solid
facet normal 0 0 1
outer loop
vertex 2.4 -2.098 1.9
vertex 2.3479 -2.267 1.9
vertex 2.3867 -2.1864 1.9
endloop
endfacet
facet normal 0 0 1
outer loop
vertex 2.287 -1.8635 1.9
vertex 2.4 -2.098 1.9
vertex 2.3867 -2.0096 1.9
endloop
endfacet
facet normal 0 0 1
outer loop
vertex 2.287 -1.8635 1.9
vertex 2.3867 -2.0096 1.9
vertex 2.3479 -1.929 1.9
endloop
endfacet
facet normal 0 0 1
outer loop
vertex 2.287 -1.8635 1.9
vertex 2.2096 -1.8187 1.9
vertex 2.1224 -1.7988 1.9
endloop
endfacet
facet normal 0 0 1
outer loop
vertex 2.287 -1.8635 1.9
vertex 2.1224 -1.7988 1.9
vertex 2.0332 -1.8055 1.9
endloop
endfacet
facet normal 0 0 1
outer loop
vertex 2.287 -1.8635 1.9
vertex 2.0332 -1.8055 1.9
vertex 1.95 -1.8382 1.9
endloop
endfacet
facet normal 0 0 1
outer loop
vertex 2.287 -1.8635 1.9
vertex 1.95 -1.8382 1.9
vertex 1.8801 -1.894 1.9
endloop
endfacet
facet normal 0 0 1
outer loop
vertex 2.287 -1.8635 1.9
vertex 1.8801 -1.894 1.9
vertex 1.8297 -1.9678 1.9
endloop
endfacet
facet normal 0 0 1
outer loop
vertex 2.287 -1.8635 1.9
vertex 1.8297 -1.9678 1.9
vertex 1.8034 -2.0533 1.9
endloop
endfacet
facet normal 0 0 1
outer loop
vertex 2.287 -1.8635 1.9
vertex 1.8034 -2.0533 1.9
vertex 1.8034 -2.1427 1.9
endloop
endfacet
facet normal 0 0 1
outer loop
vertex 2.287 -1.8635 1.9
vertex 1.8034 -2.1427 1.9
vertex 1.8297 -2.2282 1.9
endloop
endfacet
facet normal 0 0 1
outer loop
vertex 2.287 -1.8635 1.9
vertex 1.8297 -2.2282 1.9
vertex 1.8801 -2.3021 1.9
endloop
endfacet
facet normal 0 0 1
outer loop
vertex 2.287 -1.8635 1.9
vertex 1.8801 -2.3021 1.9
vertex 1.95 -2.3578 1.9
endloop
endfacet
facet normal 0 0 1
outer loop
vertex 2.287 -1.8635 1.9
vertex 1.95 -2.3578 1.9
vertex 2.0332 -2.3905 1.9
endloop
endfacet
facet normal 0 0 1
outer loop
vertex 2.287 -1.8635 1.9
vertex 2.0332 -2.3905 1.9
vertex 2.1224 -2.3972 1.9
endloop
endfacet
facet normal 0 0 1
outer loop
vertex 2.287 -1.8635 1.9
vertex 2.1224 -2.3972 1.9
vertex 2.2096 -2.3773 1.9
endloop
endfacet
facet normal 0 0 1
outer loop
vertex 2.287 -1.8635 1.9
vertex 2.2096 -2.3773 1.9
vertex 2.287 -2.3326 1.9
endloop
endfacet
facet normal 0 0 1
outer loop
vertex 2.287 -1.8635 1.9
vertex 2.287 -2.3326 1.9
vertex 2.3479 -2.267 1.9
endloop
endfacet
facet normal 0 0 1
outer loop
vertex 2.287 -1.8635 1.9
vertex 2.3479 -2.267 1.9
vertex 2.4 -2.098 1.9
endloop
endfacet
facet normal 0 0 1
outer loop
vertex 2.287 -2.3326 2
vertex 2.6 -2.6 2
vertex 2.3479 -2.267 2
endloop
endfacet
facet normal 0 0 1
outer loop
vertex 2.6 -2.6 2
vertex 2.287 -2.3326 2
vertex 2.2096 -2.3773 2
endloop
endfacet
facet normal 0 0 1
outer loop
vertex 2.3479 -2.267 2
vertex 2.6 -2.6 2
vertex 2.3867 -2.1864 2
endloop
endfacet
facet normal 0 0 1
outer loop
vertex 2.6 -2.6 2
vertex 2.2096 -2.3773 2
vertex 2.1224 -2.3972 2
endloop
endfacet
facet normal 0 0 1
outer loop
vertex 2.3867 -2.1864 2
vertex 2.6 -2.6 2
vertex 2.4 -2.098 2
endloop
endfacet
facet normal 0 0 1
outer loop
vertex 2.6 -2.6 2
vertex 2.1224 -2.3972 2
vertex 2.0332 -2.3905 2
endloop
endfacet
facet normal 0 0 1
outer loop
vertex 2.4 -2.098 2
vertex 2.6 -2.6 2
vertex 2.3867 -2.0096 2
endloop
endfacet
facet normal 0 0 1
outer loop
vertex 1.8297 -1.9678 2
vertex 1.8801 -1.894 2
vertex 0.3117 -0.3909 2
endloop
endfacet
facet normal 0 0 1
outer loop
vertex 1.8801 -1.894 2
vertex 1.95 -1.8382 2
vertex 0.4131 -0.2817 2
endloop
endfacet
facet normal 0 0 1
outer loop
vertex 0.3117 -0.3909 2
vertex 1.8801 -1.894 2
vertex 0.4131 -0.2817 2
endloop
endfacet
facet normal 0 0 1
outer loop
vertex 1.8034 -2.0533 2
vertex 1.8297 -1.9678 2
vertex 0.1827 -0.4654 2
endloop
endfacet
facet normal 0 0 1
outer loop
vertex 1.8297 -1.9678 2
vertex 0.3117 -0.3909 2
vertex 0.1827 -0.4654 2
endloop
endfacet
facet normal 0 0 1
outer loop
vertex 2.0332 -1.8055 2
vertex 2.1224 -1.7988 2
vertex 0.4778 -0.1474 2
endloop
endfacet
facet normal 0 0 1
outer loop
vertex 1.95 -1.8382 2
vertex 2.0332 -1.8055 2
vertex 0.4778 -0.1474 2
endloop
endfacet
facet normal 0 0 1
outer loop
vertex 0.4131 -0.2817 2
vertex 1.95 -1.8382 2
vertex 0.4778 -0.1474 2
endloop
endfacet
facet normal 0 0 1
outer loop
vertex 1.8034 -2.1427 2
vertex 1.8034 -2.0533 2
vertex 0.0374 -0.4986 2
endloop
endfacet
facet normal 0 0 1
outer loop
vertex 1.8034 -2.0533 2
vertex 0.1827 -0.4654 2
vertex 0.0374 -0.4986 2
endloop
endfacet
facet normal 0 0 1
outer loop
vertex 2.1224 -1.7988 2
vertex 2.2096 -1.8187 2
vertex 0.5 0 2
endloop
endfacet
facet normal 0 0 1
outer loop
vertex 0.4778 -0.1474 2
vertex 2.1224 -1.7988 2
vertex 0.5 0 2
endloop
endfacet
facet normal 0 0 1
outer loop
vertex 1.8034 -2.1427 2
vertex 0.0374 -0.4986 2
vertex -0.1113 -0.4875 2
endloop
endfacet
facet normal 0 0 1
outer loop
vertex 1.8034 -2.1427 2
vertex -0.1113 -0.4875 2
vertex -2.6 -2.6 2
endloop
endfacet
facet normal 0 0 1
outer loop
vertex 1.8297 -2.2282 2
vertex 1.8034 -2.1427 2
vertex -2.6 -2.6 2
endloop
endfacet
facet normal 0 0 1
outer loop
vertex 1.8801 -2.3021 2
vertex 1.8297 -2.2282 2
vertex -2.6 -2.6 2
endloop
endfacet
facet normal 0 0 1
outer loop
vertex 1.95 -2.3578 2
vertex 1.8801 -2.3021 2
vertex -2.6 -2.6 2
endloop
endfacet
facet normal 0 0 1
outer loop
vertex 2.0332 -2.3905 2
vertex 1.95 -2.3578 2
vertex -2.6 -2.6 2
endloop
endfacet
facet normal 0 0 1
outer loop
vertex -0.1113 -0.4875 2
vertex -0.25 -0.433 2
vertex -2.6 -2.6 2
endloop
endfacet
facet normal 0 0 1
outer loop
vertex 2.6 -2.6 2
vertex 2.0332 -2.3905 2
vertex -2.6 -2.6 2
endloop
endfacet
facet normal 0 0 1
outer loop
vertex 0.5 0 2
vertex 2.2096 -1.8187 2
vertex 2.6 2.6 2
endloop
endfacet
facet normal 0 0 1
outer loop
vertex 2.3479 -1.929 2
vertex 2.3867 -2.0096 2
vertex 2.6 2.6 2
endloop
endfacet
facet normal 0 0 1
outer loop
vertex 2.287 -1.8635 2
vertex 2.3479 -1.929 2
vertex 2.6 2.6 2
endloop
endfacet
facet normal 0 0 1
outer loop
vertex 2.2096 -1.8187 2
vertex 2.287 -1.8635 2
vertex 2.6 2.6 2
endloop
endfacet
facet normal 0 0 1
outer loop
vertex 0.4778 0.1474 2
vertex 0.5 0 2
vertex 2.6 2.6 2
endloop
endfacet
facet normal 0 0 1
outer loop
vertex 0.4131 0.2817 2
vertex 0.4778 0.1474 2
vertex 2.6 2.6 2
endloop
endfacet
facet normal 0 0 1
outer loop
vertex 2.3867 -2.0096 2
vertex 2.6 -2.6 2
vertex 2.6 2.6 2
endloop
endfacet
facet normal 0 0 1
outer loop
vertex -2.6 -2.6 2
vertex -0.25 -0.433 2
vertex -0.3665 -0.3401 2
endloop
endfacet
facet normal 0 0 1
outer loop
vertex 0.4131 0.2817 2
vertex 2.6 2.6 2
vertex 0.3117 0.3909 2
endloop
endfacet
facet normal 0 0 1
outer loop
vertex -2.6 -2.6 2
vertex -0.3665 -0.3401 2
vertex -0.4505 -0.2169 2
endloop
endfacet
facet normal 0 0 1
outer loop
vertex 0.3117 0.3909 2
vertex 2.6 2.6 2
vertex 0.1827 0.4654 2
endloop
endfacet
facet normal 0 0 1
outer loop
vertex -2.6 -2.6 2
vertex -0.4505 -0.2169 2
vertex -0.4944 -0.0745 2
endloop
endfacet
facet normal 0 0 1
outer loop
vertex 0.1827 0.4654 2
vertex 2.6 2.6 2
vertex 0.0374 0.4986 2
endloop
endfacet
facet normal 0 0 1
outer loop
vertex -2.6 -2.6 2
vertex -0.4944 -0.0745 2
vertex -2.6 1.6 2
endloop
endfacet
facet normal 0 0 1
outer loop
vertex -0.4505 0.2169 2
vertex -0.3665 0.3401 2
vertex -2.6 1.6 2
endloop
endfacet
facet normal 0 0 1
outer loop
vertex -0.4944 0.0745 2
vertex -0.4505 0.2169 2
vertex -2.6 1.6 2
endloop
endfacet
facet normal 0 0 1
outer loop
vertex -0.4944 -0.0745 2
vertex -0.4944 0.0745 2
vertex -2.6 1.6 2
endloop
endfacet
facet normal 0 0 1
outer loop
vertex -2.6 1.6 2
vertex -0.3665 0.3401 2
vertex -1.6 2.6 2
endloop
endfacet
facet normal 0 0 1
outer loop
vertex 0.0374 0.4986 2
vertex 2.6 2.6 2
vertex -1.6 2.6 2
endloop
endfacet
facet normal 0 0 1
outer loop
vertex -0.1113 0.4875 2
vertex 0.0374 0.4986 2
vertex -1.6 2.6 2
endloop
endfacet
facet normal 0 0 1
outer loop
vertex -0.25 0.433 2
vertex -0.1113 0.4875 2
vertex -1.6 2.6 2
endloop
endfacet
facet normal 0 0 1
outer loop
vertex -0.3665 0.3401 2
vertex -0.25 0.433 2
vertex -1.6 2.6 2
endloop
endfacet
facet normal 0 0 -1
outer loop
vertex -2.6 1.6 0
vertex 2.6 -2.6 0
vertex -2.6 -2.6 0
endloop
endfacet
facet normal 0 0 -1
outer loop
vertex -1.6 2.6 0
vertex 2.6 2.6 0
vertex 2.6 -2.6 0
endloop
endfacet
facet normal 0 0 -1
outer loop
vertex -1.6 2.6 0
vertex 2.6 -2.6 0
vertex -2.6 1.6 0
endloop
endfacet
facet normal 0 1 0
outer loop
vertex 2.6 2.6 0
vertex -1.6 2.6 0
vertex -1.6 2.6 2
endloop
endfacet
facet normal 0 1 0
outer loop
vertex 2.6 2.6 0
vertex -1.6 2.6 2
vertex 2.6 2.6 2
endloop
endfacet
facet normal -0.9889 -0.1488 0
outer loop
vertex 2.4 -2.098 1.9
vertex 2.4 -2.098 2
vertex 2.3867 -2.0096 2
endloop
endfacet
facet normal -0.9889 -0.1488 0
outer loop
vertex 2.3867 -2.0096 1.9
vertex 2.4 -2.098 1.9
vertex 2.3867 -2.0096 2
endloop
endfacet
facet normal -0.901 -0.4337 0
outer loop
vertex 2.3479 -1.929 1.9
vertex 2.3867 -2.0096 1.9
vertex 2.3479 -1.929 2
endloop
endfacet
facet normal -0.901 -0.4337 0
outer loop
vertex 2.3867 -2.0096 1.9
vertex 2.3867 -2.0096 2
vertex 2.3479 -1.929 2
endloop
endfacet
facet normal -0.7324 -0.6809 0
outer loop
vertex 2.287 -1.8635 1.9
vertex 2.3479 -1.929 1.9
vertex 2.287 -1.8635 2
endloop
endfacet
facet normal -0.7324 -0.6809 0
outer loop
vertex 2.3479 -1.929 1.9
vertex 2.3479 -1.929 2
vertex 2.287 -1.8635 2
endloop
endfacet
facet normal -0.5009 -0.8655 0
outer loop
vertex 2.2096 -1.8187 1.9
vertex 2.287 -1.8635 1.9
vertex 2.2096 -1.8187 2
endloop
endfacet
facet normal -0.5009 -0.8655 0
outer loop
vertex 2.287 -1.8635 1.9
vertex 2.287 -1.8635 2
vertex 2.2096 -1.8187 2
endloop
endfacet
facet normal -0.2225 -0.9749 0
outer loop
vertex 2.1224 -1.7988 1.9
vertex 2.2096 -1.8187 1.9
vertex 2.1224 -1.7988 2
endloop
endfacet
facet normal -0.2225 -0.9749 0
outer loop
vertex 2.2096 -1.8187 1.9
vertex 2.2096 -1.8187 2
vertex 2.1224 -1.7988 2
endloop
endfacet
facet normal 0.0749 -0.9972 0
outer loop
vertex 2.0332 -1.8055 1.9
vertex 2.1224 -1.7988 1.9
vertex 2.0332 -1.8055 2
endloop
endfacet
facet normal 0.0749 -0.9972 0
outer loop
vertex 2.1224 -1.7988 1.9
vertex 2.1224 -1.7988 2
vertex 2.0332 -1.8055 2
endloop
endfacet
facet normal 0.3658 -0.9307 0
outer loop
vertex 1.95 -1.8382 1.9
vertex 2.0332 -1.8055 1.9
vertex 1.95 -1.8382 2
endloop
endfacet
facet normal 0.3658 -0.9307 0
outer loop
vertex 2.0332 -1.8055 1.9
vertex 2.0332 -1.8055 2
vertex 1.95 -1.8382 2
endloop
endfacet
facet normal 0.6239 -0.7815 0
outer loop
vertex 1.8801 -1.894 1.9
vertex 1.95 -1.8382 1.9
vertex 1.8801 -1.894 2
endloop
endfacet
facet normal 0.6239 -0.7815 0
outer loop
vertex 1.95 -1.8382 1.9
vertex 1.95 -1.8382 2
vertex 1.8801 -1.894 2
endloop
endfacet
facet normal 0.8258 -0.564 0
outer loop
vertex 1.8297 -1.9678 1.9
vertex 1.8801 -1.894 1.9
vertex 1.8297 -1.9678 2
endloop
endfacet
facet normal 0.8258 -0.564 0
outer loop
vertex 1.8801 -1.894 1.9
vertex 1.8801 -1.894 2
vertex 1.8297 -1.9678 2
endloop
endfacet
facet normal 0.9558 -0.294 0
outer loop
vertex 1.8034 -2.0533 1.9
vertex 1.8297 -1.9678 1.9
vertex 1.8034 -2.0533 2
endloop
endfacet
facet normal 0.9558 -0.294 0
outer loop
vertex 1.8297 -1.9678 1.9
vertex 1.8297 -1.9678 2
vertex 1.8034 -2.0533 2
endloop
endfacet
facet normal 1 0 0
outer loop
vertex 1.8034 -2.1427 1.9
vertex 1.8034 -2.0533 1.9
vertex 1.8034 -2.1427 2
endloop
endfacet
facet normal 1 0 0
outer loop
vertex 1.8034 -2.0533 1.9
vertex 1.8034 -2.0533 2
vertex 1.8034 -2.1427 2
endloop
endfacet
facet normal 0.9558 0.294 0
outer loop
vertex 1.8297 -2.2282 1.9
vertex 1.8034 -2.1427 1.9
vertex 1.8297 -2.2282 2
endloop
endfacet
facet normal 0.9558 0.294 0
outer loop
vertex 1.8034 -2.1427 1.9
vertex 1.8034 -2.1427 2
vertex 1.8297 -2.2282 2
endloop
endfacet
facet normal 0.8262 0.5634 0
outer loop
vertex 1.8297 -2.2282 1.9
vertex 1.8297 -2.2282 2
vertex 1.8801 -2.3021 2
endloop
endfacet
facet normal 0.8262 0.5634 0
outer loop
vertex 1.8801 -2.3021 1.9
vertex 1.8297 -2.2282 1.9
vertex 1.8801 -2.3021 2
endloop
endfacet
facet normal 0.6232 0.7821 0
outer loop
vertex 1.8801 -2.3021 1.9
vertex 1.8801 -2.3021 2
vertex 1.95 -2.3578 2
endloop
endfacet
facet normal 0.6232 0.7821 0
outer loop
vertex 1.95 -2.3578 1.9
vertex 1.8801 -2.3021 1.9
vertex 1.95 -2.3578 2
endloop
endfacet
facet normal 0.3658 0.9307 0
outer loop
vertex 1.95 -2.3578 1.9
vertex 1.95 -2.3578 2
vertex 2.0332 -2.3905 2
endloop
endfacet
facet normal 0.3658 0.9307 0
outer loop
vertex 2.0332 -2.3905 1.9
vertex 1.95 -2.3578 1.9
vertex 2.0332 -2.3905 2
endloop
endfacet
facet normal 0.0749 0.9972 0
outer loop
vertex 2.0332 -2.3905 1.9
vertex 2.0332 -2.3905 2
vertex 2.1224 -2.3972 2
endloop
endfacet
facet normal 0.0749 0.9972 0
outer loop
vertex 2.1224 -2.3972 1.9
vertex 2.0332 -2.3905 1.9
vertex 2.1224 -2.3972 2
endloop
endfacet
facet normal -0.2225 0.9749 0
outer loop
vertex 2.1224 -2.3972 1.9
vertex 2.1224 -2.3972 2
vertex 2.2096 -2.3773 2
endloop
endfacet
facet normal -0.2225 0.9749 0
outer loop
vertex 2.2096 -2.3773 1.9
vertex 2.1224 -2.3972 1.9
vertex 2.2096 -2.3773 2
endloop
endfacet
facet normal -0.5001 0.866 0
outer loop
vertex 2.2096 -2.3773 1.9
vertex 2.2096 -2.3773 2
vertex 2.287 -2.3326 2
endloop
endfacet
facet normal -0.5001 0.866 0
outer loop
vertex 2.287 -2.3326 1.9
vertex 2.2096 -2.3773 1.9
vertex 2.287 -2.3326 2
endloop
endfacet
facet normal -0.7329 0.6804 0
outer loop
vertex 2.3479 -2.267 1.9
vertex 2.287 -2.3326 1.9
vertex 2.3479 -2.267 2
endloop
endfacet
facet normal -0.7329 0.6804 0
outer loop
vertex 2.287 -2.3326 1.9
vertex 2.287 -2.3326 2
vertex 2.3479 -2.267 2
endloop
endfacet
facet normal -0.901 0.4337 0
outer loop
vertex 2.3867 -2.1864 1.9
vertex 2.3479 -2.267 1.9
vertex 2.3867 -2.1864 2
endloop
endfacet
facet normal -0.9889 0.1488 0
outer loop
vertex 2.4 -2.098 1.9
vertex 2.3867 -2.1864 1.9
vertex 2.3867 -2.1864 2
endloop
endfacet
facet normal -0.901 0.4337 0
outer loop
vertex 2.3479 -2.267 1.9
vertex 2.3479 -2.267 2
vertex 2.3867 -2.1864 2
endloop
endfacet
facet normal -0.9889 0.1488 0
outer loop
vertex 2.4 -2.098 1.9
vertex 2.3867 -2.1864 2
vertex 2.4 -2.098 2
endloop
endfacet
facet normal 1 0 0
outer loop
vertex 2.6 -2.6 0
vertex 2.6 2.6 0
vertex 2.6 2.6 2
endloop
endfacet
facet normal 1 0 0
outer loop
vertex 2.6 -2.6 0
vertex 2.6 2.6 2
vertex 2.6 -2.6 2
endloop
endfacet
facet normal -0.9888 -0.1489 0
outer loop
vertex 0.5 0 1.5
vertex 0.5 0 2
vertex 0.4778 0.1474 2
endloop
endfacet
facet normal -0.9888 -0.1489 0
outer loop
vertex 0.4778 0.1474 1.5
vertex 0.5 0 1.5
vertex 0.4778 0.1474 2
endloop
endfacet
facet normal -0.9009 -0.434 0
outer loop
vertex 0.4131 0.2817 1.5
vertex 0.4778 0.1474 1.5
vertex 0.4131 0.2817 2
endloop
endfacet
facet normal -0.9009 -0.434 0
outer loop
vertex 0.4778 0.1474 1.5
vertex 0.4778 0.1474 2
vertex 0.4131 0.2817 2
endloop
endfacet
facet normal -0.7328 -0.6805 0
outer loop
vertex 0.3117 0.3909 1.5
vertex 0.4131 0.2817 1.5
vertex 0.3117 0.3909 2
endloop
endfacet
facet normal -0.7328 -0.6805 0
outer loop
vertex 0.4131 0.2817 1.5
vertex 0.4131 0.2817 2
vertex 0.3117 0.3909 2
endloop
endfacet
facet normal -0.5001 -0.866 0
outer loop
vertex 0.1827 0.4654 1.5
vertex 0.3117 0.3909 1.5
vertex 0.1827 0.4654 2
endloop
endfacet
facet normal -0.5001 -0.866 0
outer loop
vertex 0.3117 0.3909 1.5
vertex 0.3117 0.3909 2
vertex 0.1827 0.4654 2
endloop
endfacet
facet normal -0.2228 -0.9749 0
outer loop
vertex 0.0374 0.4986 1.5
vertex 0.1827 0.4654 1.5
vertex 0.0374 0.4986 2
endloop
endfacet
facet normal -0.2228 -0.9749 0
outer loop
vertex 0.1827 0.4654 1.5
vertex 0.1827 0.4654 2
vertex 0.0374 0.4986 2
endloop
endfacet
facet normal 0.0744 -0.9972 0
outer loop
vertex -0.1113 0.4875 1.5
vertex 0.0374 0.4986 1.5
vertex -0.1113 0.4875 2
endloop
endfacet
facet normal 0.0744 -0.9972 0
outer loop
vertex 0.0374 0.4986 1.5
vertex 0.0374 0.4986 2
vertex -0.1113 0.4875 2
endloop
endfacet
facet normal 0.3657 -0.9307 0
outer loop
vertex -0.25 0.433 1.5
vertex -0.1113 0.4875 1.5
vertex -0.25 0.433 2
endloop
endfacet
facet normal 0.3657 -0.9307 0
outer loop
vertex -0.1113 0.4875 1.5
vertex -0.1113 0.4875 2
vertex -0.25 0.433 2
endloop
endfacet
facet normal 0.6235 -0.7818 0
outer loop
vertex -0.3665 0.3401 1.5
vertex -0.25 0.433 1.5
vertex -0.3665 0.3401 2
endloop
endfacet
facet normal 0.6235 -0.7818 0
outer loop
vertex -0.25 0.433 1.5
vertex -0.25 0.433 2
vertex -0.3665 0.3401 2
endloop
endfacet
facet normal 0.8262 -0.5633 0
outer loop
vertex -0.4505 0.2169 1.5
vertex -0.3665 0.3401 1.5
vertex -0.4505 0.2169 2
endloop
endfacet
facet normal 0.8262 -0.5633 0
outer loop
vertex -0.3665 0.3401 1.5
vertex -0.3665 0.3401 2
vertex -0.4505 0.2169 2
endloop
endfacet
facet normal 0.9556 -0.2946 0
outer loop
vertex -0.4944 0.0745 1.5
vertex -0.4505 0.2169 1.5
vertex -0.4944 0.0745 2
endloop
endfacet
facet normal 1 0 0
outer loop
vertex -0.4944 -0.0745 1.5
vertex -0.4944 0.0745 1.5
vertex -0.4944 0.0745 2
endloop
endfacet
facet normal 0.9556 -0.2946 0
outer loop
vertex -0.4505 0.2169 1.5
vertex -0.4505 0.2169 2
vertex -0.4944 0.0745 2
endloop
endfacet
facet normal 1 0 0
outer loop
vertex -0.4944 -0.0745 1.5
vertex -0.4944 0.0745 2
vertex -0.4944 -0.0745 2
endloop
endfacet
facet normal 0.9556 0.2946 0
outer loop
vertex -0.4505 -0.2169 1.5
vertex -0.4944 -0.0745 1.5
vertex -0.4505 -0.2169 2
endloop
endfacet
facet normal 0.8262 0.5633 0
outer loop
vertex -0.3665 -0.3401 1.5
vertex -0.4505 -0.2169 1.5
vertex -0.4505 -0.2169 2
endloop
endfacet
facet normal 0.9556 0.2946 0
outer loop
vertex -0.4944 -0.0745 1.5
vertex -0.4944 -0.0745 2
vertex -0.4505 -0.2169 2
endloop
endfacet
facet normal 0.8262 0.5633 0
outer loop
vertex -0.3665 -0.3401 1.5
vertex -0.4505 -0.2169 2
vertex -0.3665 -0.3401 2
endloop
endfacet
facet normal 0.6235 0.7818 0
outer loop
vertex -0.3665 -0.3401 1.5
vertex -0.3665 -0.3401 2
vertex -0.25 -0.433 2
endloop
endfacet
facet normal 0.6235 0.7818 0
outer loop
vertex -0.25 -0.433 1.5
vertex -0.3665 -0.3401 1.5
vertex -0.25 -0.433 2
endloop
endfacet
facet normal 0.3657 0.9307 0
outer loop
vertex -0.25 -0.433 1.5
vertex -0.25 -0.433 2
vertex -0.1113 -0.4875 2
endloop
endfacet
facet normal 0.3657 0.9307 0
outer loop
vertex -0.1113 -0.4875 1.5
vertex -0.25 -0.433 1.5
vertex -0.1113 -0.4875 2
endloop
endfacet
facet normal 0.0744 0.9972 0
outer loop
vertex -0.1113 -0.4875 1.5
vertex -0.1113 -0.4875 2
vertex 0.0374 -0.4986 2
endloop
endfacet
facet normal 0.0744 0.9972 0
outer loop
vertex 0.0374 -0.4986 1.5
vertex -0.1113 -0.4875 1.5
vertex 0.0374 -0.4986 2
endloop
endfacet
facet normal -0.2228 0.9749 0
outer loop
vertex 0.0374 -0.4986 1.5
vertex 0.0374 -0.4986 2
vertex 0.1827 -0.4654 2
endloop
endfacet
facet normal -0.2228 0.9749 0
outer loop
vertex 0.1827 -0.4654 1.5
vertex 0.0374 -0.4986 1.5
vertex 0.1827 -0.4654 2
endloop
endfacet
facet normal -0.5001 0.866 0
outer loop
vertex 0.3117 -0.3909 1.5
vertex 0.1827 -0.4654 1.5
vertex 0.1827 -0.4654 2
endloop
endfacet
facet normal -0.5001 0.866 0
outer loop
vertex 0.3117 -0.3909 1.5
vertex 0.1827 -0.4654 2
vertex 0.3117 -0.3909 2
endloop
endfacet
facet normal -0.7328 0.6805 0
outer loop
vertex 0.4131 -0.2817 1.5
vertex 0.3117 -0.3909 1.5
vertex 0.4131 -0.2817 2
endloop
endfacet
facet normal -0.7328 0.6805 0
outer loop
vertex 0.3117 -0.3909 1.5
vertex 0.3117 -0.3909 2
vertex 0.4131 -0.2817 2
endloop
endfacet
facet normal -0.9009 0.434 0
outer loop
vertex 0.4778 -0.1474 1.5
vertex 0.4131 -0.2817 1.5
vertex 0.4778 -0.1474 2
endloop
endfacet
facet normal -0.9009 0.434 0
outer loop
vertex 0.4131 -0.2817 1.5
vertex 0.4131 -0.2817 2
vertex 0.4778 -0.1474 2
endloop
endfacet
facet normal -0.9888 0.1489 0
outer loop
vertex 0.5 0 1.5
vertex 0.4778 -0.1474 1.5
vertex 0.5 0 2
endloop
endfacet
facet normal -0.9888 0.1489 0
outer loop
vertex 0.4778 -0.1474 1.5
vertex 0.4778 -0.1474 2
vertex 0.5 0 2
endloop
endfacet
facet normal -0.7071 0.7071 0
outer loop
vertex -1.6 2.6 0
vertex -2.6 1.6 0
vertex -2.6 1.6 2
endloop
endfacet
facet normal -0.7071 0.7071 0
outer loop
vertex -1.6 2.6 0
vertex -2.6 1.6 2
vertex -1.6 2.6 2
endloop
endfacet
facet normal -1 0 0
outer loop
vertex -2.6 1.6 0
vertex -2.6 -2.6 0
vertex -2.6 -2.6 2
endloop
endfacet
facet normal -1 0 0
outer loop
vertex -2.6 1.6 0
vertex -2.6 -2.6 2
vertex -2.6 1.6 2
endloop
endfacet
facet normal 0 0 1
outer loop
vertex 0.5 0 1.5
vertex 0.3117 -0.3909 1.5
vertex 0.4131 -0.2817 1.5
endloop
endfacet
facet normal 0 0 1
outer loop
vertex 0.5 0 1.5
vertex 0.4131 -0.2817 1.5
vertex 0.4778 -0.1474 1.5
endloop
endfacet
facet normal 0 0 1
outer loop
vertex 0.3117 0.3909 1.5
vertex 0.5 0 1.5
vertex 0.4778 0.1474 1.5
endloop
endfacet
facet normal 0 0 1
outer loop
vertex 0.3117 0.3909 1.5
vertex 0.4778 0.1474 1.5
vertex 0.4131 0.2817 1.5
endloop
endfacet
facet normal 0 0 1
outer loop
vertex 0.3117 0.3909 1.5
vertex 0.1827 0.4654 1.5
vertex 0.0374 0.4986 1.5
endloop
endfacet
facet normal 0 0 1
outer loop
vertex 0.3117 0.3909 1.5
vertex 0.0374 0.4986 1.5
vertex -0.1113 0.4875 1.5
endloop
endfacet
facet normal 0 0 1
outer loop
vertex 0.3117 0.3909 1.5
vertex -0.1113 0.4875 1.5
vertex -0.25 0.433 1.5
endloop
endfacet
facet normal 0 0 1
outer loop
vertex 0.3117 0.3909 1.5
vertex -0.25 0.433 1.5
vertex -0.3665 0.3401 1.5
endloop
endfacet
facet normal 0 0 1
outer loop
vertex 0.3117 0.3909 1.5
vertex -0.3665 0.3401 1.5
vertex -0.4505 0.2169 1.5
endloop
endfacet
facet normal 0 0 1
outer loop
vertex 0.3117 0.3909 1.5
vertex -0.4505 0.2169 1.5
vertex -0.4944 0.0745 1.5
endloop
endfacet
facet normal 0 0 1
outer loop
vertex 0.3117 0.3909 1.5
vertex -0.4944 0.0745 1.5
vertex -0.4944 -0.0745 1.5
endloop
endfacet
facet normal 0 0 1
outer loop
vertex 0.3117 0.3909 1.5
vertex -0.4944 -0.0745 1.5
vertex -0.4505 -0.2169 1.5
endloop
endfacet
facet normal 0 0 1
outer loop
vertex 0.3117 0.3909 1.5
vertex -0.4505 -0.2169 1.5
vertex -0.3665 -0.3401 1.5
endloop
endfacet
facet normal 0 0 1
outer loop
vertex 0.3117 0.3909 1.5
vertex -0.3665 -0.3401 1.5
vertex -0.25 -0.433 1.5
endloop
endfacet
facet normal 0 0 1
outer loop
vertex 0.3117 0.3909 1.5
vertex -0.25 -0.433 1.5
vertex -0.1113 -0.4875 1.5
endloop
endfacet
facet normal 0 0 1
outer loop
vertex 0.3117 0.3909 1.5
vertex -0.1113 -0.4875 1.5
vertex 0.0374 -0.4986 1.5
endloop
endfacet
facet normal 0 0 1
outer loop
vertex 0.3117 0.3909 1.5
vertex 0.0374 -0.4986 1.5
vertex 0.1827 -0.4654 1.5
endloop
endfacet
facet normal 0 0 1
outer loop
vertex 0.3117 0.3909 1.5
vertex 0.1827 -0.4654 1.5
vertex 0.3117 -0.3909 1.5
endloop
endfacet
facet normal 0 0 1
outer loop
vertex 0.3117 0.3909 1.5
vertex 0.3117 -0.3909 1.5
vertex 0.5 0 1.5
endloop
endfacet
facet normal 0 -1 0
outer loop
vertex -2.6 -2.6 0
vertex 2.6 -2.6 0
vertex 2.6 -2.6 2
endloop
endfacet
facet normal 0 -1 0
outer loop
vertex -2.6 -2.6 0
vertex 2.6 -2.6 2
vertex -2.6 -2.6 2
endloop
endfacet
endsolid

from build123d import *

# Parameters (mm, degrees)
EXTRUDE_1_DEPTH     = 2
SKETCH_2_R          = 0.5
CUT_EXTRUDE_1_DEPTH = 0.5
SKETCH_2_3_R        = 0.3
CUT_EXTRUDE_2_DEPTH = 0.1


with BuildPart() as part:
    # 草图1 → 凸台-拉伸1 (new body)
    with BuildSketch(Plane.XY):
        Polygon((-1.6, 2.6), (2.6, 2.6), (2.6, -2.6), (-2.6, -2.6), (-2.6, 1.6), align=None)
    extrude(amount=EXTRUDE_1_DEPTH)

    # 草图2 → 切除-拉伸1 (cut)
    with BuildSketch(Plane.XY.offset(2)):
        Circle(SKETCH_2_R)
    extrude(amount=-CUT_EXTRUDE_1_DEPTH, mode=Mode.SUBTRACT)

    # 草图2<3> → 切除-拉伸2 (cut)
    with BuildSketch(Plane.XY.offset(2)):
        with Locations((2.1, -2.098009883)):
            Circle(SKETCH_2_3_R)
    extrude(amount=-CUT_EXTRUDE_2_DEPTH, mode=Mode.SUBTRACT)


solid = part.part
